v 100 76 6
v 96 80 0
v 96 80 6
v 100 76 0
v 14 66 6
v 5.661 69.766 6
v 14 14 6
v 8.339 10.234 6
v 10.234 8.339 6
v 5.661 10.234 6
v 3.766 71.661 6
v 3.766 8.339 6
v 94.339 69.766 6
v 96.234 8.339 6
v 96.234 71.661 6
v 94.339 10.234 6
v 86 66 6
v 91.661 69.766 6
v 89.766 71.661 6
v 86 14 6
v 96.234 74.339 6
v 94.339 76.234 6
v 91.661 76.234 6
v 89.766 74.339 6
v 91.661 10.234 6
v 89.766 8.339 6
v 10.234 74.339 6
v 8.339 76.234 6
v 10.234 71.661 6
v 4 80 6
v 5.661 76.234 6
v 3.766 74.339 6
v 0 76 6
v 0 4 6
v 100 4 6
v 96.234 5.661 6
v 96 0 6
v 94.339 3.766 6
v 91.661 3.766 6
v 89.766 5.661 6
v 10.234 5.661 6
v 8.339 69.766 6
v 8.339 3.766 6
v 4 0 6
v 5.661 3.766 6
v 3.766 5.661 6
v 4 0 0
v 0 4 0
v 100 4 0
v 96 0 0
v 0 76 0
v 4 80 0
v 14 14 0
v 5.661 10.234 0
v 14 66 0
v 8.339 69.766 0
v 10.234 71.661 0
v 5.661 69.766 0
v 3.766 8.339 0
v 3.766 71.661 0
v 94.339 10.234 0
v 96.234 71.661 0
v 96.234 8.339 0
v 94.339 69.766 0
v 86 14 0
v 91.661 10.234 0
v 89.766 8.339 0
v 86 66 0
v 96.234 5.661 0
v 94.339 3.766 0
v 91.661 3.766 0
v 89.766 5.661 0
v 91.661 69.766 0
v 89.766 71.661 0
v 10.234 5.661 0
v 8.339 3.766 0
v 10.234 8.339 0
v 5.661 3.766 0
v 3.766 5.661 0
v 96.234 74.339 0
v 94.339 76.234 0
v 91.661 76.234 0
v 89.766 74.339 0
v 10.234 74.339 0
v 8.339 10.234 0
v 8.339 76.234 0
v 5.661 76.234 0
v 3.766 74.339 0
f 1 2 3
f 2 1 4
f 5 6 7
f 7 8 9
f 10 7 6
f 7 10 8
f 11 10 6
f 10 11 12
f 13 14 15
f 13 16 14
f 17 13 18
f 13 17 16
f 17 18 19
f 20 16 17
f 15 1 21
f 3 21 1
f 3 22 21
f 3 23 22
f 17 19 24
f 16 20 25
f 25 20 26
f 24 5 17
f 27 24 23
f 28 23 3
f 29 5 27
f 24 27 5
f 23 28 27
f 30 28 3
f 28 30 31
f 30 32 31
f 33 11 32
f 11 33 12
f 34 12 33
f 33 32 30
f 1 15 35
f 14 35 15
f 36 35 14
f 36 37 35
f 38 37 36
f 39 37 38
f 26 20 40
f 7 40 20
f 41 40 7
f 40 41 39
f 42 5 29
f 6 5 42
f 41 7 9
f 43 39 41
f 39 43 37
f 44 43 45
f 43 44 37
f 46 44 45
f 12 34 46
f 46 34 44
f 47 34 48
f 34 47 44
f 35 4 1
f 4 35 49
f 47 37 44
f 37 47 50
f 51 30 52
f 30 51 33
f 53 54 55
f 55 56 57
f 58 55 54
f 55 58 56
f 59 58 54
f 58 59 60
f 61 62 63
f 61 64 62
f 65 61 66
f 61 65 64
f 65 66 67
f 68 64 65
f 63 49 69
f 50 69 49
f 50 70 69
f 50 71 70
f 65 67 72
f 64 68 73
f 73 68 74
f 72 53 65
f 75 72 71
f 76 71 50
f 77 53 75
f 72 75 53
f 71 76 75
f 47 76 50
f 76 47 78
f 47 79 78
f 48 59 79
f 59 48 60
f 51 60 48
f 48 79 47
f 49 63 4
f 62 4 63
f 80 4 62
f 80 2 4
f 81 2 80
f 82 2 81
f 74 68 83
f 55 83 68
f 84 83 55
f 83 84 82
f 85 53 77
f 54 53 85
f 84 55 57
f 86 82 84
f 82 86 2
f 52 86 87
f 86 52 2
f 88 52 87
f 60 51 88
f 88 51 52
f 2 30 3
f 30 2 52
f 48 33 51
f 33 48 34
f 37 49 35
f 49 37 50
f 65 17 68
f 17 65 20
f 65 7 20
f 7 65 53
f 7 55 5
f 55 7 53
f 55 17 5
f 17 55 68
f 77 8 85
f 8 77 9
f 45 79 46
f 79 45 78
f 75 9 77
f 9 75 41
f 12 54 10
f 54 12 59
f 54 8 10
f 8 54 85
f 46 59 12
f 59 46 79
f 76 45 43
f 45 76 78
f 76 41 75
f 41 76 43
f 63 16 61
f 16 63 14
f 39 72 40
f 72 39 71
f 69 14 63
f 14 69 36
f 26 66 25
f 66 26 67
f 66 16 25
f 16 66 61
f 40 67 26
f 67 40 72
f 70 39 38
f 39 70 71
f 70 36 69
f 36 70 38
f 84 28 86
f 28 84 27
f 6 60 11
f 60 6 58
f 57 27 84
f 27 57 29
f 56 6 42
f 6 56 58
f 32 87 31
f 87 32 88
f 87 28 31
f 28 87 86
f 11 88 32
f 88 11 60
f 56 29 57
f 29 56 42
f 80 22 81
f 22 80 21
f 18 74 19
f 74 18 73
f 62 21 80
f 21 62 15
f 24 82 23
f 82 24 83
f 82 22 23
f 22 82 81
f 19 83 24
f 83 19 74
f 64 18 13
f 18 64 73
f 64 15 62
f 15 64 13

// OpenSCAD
$fn = 32;

// ----------------------------------------------------------------------
// Frame plate: 100 x 80 frame, 14 mm rails
// ----------------------------------------------------------------------

// --- parameters (mm) ---
plate_l = 100;            // plate length, X
plate_w = 80;             // plate width, Y
plate_t = 6;              // plate thickness, Z (extrusion height)
corner_c = 4;             // corner chamfer
frame_bar = 14;           // frame rail width
bolt_r = 3.5;             // corner bolt window radius
bolt_inset = 7;           // bolt centre inset from the edges

win_l = plate_l - 2 * frame_bar;  // window length
win_w = plate_w - 2 * frame_bar;  // window width
bolt_d = 2 * bolt_r;  // corner hole diameter

profile = [[4, 0], [96, 0], [100, 4], [100, 76], [96, 80], [4, 80], [0, 76], [0, 4]];  // primary outline, 8 points, counter clockwise
void_1 = [[14, 14], [86, 14], [86, 66], [14, 66]];  // the window, 4 points
void_2 = [[10.234, 8.339], [8.339, 10.234], [5.661, 10.234], [3.766, 8.339], [3.766, 5.661], [5.661, 3.766], [8.339, 3.766], [10.234, 5.661]];  // corner bolt window, 8 points
void_3 = [[96.234, 8.339], [94.339, 10.234], [91.661, 10.234], [89.766, 8.339], [89.766, 5.661], [91.661, 3.766], [94.339, 3.766], [96.234, 5.661]];  // corner bolt window, 8 points
void_4 = [[10.234, 74.339], [8.339, 76.234], [5.661, 76.234], [3.766, 74.339], [3.766, 71.661], [5.661, 69.766], [8.339, 69.766], [10.234, 71.661]];  // corner bolt window, 8 points
void_5 = [[96.234, 74.339], [94.339, 76.234], [91.661, 76.234], [89.766, 74.339], [89.766, 71.661], [91.661, 69.766], [94.339, 69.766], [96.234, 71.661]];  // corner bolt window, 8 points

// --- the one profile operation ---
difference() {
  linear_extrude(height = plate_t) polygon(points = profile);
  translate([0, 0, -1])
    linear_extrude(height = plate_t + 2) polygon(points = void_1);
  translate([0, 0, -1])
    linear_extrude(height = plate_t + 2) polygon(points = void_2);
  translate([0, 0, -1])
    linear_extrude(height = plate_t + 2) polygon(points = void_3);
  translate([0, 0, -1])
    linear_extrude(height = plate_t + 2) polygon(points = void_4);
  translate([0, 0, -1])
    linear_extrude(height = plate_t + 2) polygon(points = void_5);
}
